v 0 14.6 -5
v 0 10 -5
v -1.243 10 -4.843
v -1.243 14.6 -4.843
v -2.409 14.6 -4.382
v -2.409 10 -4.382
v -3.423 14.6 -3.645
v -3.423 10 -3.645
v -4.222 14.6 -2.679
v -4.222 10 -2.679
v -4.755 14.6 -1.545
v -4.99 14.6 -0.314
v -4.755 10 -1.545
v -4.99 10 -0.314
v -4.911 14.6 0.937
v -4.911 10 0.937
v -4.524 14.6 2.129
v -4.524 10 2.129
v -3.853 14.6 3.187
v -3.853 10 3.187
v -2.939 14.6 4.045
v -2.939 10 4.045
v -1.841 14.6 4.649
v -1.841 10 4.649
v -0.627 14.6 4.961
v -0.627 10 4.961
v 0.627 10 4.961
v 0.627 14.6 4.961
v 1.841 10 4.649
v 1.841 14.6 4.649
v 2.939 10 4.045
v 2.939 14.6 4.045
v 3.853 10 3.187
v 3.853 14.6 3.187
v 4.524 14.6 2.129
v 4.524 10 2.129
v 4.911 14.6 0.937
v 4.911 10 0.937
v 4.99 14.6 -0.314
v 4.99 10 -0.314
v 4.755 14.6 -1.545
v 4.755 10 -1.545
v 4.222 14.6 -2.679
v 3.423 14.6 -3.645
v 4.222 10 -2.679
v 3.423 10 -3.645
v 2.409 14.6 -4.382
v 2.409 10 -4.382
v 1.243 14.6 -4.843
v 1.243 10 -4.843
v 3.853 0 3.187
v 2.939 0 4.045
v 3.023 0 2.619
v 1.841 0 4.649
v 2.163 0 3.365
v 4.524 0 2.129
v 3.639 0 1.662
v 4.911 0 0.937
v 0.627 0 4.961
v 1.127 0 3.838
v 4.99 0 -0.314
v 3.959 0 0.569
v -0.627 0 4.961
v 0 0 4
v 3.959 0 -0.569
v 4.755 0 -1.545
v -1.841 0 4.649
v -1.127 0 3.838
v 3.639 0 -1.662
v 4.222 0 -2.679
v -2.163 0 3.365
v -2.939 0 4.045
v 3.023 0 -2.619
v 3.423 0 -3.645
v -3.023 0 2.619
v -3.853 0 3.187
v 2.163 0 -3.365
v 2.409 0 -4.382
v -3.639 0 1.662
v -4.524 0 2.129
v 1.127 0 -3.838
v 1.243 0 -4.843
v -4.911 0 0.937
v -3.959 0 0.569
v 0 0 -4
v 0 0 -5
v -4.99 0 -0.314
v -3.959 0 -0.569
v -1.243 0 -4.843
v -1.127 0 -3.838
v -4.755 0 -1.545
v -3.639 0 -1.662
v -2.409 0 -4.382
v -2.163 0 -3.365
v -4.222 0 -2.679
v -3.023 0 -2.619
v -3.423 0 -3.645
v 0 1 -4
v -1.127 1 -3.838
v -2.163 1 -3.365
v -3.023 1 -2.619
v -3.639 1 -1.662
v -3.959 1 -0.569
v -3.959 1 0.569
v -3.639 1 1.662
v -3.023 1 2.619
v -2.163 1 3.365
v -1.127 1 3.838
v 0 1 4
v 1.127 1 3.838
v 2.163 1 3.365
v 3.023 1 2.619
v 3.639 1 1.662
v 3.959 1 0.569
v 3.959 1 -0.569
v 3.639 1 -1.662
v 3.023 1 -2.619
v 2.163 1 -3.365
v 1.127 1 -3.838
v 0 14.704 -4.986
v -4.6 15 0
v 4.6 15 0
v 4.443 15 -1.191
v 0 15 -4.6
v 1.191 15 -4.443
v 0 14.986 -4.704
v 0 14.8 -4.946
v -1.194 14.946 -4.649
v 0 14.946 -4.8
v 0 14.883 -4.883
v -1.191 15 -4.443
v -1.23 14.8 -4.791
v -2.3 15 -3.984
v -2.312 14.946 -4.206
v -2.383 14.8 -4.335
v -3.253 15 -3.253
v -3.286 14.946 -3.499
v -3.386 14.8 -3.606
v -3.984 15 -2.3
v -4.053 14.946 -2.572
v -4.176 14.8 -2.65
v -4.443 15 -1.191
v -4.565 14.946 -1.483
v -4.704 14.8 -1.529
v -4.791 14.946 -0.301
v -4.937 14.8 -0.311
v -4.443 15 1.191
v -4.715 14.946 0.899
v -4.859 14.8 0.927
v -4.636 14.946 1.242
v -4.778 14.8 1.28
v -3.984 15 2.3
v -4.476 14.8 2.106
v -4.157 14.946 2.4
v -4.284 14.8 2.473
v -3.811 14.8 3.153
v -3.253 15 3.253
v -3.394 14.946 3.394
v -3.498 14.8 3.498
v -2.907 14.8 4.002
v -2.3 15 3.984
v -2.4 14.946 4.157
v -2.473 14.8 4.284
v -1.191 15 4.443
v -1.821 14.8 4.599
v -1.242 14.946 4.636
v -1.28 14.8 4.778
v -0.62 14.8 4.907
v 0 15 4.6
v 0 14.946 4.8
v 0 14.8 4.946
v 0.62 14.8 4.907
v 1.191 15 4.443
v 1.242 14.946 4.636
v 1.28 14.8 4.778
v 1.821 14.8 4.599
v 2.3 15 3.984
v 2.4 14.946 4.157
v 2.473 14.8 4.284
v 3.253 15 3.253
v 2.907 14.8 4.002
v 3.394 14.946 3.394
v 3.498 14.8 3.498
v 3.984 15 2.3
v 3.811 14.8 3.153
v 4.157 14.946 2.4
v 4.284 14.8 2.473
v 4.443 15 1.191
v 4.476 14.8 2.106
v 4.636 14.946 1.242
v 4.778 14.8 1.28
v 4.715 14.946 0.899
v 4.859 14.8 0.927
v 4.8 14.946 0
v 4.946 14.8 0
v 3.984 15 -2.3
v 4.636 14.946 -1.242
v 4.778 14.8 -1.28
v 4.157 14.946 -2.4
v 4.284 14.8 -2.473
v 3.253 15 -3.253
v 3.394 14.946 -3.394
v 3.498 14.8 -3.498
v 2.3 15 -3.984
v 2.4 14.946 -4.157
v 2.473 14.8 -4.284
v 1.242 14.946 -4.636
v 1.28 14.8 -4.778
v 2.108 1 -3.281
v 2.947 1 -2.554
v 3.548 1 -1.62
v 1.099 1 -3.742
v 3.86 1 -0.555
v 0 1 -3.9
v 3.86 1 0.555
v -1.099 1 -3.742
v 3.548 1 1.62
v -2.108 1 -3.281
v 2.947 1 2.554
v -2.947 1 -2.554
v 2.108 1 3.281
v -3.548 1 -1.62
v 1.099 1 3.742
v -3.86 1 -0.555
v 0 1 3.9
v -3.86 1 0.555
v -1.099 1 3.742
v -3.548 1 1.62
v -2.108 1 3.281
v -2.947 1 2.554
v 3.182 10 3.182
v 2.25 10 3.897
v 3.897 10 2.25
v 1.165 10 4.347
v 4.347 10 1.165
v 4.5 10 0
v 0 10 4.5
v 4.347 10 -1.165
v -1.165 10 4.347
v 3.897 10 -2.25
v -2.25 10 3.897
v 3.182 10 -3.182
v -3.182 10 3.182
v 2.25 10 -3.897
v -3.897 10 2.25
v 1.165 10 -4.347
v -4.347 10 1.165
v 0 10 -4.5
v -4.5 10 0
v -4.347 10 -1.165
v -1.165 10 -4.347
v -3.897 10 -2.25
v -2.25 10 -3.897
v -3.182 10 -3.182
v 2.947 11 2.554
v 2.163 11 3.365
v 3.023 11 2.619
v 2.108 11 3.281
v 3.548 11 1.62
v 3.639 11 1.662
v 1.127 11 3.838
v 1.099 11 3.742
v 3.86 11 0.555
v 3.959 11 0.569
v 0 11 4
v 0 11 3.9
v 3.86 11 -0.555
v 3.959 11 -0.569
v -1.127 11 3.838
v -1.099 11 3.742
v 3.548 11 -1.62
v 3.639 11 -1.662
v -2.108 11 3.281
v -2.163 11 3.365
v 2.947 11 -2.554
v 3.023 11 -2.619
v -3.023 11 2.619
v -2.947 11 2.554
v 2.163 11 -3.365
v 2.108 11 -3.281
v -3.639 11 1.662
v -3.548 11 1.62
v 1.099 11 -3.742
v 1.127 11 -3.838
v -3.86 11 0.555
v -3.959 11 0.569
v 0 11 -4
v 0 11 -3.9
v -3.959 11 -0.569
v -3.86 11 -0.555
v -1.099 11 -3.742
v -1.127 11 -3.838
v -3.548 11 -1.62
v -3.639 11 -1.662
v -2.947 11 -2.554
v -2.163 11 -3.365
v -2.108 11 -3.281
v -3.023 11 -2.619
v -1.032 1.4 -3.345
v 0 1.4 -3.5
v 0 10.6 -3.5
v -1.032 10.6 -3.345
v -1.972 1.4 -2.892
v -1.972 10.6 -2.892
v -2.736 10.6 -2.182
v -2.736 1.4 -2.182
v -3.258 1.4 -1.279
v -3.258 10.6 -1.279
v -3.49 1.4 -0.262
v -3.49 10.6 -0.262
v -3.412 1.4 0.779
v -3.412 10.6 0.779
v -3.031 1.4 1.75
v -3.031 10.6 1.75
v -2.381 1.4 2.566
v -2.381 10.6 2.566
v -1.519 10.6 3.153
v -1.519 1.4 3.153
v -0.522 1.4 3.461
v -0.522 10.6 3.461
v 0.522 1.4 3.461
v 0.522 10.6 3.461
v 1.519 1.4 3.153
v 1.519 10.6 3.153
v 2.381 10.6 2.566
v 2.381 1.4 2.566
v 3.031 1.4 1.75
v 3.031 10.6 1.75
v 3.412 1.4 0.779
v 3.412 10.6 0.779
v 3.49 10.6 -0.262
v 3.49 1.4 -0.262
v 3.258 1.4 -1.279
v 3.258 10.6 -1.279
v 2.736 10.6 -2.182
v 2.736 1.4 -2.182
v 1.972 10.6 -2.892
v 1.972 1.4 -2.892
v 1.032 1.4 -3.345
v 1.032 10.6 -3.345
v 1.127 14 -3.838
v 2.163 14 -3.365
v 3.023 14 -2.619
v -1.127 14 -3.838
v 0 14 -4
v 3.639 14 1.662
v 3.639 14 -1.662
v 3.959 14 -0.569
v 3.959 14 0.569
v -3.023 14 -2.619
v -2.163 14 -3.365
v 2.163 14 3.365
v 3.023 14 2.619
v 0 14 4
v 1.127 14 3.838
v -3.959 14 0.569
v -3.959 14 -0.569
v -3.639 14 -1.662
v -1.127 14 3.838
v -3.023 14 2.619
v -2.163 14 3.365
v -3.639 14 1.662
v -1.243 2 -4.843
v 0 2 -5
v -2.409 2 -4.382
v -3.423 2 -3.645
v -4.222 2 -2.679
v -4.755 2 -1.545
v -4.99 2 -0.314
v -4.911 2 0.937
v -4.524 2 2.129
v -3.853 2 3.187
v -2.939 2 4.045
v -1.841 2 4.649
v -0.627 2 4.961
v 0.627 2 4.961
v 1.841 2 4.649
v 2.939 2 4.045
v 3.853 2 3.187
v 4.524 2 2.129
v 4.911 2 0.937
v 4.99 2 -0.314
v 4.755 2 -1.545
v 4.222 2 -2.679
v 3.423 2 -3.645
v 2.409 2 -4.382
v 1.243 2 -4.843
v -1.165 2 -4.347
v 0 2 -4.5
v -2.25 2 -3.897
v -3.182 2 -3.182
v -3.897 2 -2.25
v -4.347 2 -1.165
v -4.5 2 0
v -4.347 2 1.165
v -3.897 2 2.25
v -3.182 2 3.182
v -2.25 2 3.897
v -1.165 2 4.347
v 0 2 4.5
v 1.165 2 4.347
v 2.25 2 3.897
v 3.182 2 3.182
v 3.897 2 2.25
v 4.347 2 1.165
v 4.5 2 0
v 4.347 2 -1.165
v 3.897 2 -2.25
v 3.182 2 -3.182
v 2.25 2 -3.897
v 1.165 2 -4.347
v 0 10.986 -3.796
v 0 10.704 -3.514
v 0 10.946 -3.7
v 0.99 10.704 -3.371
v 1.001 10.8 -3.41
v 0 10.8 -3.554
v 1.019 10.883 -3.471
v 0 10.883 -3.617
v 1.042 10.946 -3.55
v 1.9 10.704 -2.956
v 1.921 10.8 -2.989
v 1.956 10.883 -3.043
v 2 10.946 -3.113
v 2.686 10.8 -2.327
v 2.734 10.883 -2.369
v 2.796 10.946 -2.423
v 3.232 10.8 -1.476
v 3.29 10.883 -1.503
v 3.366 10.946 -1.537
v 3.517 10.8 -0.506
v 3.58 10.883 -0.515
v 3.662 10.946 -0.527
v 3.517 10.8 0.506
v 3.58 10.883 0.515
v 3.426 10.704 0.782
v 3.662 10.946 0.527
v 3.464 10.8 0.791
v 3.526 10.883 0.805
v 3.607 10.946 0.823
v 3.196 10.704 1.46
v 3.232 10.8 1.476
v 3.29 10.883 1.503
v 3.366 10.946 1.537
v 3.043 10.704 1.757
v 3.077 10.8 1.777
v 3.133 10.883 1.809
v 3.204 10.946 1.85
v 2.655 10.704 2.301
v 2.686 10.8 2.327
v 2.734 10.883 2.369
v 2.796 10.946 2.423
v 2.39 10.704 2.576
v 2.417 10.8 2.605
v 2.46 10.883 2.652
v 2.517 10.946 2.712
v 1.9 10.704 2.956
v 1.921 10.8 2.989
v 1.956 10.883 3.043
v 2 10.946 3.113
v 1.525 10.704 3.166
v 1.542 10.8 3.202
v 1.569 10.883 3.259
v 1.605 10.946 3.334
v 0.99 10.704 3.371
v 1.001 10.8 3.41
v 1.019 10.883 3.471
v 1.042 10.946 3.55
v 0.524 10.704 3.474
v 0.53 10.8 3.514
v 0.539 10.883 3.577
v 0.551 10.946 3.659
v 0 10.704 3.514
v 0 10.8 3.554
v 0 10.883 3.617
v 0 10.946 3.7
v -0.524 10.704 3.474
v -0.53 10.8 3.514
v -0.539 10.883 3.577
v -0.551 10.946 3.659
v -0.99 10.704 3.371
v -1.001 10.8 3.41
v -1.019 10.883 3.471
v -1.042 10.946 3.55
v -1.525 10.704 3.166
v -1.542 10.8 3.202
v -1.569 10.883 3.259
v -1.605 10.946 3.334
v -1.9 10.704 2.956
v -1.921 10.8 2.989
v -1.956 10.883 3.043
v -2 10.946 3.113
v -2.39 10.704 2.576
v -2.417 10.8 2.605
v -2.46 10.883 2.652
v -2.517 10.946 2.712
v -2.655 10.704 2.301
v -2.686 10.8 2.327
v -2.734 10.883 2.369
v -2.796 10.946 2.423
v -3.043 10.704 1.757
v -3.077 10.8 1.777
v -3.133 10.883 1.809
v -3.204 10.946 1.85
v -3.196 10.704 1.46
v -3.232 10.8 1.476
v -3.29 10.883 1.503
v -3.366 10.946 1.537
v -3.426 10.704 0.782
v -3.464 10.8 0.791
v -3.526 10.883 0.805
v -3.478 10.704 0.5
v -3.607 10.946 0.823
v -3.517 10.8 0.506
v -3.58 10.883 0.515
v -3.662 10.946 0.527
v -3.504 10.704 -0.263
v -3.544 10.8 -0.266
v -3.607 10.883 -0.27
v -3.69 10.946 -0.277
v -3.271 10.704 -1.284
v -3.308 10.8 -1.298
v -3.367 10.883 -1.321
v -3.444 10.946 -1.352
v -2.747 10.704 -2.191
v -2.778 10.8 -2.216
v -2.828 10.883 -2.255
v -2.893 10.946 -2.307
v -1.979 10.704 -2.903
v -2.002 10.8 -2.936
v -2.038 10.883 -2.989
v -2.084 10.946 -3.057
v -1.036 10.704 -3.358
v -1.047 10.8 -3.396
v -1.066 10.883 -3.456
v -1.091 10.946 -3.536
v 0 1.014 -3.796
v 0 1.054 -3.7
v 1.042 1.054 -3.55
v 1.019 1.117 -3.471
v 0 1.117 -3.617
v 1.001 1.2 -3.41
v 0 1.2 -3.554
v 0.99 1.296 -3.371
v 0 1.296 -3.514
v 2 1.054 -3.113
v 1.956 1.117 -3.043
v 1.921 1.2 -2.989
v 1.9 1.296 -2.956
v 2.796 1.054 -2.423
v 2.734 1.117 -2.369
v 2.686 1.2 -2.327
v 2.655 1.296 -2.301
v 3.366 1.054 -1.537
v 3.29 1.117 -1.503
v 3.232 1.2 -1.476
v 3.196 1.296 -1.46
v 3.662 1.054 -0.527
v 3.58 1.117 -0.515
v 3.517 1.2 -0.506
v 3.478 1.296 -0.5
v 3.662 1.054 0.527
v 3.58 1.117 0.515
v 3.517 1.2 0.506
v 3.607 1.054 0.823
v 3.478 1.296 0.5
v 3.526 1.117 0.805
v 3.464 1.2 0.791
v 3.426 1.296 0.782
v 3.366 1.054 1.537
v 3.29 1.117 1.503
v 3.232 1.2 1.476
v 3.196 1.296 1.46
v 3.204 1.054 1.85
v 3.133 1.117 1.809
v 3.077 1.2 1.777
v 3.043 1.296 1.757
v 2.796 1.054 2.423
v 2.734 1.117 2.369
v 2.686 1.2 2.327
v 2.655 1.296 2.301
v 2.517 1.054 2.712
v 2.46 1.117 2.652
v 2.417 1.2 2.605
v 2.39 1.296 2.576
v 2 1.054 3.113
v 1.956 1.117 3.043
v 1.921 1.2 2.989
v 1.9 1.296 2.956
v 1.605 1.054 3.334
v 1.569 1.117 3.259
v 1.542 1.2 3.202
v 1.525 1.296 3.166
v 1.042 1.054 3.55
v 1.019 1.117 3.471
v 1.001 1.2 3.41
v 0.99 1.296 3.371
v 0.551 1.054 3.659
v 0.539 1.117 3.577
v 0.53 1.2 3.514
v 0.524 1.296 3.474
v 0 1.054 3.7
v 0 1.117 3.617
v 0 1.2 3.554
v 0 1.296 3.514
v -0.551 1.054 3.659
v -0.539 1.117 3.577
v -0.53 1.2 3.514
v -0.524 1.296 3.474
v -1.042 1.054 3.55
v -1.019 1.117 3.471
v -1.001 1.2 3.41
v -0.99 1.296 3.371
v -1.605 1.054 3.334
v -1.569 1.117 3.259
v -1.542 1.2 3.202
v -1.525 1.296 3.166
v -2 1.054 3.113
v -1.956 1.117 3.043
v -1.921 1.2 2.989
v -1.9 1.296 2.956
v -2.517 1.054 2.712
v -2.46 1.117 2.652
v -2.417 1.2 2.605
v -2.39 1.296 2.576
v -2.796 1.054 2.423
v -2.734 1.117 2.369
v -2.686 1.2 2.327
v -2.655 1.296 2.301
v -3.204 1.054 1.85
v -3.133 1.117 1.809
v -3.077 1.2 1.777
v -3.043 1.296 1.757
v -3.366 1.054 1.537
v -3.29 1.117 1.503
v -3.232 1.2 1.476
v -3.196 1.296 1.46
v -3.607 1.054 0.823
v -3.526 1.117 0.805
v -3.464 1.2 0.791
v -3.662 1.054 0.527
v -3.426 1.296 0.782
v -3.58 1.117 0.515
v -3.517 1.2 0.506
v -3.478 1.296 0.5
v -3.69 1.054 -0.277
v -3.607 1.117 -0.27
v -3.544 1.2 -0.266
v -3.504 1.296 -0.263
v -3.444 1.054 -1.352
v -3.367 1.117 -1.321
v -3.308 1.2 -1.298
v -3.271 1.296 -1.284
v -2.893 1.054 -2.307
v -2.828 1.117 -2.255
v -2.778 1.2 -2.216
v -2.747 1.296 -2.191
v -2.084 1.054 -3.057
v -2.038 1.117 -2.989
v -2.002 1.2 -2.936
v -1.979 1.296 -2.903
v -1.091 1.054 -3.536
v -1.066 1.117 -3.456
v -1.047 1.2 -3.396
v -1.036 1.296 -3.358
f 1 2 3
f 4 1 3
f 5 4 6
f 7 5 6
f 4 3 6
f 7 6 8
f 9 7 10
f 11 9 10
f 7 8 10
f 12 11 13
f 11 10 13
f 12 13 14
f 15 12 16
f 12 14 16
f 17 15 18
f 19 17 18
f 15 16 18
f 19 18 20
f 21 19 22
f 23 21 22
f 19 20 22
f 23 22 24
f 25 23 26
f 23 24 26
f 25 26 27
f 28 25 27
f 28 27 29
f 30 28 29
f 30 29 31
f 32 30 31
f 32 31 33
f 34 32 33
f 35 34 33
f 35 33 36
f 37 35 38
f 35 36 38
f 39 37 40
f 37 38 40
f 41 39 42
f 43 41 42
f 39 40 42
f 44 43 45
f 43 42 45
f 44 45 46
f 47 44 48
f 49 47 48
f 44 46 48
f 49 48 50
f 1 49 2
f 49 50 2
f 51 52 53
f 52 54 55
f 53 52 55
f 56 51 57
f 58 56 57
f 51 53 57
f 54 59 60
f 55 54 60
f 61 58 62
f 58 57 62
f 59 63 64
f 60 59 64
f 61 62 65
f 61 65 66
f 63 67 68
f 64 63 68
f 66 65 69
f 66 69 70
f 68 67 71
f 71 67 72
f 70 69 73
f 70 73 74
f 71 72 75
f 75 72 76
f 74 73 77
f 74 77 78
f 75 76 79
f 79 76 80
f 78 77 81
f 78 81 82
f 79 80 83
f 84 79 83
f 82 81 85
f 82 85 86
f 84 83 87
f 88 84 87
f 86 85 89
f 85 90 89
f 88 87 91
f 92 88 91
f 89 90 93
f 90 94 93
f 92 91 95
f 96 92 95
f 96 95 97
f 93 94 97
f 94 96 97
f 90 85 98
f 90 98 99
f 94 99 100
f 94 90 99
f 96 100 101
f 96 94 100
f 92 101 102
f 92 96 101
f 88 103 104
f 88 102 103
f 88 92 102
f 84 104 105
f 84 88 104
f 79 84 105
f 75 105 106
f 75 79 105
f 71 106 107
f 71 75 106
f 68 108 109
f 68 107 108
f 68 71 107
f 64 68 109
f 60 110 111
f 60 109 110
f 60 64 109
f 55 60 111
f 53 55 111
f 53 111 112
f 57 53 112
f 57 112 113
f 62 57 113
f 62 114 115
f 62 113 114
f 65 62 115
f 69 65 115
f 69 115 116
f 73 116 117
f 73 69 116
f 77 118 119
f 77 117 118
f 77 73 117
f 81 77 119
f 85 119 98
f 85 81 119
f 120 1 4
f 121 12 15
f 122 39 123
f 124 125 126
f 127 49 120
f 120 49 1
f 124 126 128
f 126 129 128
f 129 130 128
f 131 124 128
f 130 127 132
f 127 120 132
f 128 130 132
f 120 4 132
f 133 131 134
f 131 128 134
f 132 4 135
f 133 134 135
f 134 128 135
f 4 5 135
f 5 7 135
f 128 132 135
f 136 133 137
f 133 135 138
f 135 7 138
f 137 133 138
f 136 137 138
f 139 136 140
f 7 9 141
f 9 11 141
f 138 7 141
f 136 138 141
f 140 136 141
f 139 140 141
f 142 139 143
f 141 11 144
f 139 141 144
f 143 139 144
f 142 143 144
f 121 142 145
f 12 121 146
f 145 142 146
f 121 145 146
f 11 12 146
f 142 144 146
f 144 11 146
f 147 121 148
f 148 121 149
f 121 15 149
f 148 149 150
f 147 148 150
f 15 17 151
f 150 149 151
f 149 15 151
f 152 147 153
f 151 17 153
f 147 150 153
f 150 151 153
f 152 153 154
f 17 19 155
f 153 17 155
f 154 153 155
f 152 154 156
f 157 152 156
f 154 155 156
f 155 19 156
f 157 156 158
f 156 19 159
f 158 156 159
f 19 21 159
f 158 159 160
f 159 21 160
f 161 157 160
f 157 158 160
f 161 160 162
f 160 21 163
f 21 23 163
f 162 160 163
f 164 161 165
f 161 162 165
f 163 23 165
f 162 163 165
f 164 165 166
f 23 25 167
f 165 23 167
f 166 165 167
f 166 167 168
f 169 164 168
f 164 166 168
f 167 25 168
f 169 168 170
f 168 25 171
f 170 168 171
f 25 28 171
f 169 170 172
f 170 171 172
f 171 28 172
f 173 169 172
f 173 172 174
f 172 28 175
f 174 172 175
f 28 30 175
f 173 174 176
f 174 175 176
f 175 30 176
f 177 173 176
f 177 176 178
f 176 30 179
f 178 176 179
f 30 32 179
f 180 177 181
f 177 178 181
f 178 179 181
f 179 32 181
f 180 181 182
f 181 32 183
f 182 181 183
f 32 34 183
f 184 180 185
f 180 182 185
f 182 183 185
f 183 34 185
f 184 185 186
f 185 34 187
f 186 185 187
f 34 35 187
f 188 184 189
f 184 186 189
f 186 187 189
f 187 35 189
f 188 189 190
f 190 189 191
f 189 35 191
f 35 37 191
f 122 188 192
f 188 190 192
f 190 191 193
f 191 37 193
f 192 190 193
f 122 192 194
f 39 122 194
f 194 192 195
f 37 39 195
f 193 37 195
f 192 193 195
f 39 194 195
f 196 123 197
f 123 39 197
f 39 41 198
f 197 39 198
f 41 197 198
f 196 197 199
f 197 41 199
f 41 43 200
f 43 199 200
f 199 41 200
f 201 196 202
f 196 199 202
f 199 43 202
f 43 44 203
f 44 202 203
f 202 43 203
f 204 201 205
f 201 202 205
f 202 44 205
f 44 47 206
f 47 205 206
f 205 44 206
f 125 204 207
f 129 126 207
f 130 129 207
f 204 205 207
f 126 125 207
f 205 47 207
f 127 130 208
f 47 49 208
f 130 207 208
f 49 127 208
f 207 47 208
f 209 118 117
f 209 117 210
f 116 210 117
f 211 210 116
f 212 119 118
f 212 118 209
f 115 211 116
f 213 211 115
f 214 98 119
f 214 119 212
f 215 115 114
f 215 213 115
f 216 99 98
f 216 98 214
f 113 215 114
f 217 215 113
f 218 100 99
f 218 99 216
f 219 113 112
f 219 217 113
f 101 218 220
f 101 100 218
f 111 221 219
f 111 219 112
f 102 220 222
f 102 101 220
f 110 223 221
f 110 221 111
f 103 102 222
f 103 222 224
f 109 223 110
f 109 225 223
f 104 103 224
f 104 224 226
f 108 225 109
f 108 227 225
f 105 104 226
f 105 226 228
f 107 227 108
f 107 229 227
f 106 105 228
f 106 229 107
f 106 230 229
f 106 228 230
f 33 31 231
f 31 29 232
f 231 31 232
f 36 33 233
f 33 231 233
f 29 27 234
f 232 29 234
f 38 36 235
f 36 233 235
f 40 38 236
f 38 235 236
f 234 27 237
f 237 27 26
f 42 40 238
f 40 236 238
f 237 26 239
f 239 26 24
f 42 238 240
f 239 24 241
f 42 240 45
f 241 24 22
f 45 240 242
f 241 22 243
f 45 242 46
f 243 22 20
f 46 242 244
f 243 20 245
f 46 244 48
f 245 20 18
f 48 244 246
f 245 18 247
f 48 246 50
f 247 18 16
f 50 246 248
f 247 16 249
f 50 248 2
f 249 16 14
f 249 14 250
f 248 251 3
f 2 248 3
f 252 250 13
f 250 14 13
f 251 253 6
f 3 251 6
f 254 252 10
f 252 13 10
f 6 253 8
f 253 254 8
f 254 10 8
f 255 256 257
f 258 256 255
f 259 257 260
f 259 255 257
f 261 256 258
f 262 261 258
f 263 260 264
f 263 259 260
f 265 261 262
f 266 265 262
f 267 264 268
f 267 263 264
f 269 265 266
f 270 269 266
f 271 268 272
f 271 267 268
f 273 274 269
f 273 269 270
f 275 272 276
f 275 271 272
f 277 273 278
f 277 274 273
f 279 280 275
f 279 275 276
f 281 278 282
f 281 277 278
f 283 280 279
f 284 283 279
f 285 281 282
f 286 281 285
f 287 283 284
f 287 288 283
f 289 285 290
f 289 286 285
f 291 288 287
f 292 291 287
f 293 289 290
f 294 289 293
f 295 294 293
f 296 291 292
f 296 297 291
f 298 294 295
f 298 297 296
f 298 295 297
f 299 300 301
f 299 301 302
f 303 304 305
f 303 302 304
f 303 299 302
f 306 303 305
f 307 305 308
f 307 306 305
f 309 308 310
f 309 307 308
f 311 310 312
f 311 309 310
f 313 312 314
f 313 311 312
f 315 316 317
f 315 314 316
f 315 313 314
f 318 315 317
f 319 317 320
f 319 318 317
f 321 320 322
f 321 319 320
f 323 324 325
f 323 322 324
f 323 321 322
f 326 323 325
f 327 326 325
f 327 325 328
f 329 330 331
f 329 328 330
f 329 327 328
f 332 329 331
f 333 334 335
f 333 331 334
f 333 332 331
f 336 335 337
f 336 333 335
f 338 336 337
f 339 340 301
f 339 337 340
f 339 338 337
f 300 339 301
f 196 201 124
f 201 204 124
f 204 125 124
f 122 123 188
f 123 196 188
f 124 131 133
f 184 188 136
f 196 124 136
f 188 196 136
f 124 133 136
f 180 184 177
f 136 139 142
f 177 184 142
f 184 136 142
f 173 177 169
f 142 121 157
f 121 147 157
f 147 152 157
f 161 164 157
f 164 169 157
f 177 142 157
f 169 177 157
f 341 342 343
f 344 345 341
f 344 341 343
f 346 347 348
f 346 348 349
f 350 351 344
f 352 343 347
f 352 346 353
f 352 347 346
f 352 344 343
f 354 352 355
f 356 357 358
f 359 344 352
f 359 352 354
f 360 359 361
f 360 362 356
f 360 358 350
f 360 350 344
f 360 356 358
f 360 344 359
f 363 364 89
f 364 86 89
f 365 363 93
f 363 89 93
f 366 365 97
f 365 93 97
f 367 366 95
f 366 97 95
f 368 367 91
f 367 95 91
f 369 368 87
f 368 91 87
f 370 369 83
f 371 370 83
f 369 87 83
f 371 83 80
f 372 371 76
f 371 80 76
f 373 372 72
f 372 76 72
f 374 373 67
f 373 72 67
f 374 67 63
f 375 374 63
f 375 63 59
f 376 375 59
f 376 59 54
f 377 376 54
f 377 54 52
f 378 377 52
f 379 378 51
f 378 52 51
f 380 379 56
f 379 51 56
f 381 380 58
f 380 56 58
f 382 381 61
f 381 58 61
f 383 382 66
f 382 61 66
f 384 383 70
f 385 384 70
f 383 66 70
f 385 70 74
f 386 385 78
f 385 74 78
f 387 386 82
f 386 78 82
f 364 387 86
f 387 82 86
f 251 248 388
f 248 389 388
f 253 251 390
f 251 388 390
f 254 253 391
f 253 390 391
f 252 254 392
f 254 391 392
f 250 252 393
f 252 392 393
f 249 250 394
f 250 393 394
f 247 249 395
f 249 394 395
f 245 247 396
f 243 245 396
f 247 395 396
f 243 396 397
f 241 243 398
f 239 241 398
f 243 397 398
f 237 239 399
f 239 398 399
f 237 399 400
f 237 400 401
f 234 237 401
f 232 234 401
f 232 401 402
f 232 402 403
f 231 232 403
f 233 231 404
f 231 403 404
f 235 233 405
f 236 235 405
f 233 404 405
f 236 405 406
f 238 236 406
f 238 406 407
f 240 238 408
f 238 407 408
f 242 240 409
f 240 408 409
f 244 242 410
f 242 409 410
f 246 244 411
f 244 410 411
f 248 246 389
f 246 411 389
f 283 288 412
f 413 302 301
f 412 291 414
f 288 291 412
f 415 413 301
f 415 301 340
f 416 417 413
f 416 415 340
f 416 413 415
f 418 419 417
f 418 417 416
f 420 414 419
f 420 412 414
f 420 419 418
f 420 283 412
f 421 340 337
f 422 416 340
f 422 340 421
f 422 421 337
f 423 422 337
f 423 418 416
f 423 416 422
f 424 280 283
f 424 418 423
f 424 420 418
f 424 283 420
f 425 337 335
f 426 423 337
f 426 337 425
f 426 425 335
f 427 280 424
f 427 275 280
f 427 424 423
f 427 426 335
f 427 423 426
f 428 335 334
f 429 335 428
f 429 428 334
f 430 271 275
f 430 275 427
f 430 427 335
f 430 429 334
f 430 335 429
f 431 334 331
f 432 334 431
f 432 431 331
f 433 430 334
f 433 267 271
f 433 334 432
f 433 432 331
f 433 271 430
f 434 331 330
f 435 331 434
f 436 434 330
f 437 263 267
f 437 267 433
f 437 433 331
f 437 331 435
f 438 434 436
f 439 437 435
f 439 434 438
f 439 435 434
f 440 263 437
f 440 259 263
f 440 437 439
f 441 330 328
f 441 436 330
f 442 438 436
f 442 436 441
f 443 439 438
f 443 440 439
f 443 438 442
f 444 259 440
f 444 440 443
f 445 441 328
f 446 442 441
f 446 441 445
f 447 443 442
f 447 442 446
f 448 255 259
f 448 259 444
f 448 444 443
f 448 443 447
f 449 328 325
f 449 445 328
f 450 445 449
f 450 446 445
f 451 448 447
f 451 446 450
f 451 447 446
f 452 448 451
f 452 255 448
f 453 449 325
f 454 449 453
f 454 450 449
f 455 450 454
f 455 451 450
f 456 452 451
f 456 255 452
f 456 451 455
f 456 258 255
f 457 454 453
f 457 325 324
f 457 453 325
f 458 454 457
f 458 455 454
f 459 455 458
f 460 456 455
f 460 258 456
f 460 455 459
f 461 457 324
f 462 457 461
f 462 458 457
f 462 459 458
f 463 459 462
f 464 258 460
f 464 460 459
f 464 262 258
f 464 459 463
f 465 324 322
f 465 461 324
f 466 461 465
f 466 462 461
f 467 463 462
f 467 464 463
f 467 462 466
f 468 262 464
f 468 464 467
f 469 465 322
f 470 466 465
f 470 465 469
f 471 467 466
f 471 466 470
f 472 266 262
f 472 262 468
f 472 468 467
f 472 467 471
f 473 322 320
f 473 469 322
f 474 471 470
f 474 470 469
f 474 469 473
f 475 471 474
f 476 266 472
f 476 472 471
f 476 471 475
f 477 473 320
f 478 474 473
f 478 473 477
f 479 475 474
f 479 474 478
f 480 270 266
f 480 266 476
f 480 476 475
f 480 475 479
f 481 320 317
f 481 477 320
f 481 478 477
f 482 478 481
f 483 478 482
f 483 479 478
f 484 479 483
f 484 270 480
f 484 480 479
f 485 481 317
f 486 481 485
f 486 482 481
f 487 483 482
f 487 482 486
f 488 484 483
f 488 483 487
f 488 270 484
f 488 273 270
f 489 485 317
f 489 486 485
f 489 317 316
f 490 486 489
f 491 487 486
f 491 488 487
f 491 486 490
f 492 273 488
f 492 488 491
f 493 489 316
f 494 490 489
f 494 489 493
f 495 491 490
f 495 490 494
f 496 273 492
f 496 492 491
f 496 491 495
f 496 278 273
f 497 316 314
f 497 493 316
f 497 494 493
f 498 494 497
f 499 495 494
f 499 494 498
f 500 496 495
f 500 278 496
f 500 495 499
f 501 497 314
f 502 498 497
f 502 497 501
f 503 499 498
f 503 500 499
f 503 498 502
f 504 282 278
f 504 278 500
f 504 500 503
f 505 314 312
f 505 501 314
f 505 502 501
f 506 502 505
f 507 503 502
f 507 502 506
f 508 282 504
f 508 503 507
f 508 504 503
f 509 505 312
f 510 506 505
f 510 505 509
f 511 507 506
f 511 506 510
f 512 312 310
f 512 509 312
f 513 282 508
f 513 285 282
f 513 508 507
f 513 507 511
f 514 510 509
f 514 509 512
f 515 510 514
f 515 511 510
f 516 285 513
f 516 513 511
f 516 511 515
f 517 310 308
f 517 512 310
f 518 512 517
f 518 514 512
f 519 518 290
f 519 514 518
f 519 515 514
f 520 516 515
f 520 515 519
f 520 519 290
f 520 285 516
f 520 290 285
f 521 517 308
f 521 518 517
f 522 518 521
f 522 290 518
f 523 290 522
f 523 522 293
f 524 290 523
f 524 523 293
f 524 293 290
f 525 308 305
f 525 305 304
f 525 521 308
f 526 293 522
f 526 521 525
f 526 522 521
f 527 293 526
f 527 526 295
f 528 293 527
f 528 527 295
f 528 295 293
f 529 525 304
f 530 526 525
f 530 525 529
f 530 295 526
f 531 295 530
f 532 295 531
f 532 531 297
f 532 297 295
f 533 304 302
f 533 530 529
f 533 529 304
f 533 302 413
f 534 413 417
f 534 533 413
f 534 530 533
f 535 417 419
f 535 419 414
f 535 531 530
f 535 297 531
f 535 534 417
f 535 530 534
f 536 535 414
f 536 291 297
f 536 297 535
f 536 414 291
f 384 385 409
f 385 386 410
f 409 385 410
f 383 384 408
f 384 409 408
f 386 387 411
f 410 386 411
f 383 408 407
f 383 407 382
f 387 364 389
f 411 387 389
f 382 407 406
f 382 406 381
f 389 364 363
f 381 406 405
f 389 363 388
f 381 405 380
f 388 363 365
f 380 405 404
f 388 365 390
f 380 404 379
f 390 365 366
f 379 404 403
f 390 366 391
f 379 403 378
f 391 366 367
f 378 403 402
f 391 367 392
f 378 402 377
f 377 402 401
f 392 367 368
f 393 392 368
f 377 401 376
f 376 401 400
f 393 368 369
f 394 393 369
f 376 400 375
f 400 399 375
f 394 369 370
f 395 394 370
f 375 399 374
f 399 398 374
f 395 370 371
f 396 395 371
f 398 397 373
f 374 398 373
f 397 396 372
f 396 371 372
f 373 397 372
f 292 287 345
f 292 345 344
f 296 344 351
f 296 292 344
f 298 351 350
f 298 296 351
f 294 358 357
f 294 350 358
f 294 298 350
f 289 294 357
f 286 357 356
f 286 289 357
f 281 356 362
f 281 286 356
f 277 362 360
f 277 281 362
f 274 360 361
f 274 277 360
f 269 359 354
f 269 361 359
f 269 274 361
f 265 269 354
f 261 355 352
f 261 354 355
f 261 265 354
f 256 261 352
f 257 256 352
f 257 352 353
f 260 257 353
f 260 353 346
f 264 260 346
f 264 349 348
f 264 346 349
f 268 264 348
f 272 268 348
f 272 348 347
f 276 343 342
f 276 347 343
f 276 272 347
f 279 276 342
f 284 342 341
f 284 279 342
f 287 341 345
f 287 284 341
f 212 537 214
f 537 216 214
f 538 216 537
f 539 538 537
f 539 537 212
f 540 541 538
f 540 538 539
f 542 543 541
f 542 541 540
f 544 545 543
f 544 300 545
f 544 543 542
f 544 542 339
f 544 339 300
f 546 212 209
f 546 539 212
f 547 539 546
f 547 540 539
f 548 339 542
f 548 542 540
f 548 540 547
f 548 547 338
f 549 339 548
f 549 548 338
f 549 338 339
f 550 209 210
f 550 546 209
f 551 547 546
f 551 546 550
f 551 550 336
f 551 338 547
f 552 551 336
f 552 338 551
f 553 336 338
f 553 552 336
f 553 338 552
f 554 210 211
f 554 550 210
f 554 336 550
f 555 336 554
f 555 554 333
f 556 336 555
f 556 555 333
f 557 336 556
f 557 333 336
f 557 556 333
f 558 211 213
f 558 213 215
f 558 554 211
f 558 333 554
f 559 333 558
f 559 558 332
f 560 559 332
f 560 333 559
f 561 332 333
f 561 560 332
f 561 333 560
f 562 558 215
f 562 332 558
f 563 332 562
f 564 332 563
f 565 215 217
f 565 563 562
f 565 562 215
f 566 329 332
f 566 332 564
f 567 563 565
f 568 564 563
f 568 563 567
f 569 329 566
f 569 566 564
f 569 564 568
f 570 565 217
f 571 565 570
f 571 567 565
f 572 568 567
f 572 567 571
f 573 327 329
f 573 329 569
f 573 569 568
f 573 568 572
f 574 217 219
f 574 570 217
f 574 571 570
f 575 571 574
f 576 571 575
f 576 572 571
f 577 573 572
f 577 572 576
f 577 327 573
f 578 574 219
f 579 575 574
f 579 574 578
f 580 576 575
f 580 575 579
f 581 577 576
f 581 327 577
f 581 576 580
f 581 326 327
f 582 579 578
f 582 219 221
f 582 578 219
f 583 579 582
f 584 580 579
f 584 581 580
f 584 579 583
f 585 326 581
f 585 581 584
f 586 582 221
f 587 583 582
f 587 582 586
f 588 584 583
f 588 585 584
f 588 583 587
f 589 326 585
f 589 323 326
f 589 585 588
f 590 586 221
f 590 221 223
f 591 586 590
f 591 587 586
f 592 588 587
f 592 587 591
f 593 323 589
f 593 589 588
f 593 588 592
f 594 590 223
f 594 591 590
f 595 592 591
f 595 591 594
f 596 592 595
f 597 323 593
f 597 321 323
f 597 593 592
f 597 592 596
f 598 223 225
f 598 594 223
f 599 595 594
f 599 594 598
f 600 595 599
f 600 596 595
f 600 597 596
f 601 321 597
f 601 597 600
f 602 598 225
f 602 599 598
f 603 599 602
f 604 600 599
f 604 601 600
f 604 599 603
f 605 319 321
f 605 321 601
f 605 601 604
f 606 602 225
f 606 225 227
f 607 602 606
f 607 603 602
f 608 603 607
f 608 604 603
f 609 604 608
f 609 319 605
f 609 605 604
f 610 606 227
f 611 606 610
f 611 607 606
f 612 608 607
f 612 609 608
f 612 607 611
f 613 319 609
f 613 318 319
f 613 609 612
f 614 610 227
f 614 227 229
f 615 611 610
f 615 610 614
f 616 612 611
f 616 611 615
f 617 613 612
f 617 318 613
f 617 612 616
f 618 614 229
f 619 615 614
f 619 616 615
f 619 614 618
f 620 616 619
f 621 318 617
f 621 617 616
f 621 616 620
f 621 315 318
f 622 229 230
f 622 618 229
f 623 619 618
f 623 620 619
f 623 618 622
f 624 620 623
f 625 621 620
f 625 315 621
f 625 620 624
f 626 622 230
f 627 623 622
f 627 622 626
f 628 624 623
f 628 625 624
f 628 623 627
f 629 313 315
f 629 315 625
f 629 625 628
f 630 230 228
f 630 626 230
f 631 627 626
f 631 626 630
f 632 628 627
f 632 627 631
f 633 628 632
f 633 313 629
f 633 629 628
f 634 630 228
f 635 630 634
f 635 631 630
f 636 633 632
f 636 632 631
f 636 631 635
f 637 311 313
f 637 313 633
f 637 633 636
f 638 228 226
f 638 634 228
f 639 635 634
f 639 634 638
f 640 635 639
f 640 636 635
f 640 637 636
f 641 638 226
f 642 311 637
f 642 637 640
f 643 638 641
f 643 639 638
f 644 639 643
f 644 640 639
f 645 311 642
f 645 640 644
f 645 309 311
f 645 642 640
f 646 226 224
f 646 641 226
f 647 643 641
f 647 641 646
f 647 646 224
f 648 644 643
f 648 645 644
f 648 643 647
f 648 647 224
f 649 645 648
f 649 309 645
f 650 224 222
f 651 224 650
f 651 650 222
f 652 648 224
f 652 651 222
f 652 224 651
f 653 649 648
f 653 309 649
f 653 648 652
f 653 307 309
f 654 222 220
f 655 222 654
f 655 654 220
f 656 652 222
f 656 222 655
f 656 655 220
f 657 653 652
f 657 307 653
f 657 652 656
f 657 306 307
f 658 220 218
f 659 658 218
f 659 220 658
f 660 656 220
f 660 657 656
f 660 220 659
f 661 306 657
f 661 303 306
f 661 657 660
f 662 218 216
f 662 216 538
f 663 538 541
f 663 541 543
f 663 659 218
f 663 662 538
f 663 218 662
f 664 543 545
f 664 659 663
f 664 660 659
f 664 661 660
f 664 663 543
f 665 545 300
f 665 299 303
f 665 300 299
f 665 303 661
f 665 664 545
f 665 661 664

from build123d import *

# Parameters (mm, degrees)
SHELL4_T  = -1
FILLET1_R = 0.4
FILLET2_R = 0.4
FILLET3_R = 0.4


with BuildPart() as part:
    # Sketch1 → Revolve2 (revolve)
    with BuildSketch(Plane.XY, mode=Mode.PRIVATE) as revolve2_sk:
        Polygon((0, 15), (-5, 15), (-5, 10), (-4.5, 10), (-4.5, 2), (-5, 2), (-5, 0), (0, 0), align=None)
    revolve(revolve2_sk.sketch.rotate(Axis((0, 0, 0), (0, 1, 0)), 270), axis=Axis((0, 0, 0), (0, 1, 0)))

    # Shell4
    shell4_openings = [part.faces().sort_by_distance(p)[0] for p in [
        (0, 0, 0),
    ]]
    offset(amount=SHELL4_T, openings=shell4_openings, kind=Kind.INTERSECTION)

    # Fillet1
    fillet1_edges = [part.edges().sort_by_distance(p)[0] for p in [
        (0, 15, 5),
    ]]
    fillet(fillet1_edges, radius=FILLET1_R)

    # Fillet2
    fillet2_edges = [part.edges().sort_by_distance(p)[0] for p in [
        (0, 1, 3.5),
    ]]
    fillet(fillet2_edges, radius=FILLET2_R)

    # Fillet3
    fillet3_edges = [part.edges().sort_by_distance(p)[0] for p in [
        (0, 11, 3.5),
    ]]
    fillet(fillet3_edges, radius=FILLET3_R)


solid = part.part
